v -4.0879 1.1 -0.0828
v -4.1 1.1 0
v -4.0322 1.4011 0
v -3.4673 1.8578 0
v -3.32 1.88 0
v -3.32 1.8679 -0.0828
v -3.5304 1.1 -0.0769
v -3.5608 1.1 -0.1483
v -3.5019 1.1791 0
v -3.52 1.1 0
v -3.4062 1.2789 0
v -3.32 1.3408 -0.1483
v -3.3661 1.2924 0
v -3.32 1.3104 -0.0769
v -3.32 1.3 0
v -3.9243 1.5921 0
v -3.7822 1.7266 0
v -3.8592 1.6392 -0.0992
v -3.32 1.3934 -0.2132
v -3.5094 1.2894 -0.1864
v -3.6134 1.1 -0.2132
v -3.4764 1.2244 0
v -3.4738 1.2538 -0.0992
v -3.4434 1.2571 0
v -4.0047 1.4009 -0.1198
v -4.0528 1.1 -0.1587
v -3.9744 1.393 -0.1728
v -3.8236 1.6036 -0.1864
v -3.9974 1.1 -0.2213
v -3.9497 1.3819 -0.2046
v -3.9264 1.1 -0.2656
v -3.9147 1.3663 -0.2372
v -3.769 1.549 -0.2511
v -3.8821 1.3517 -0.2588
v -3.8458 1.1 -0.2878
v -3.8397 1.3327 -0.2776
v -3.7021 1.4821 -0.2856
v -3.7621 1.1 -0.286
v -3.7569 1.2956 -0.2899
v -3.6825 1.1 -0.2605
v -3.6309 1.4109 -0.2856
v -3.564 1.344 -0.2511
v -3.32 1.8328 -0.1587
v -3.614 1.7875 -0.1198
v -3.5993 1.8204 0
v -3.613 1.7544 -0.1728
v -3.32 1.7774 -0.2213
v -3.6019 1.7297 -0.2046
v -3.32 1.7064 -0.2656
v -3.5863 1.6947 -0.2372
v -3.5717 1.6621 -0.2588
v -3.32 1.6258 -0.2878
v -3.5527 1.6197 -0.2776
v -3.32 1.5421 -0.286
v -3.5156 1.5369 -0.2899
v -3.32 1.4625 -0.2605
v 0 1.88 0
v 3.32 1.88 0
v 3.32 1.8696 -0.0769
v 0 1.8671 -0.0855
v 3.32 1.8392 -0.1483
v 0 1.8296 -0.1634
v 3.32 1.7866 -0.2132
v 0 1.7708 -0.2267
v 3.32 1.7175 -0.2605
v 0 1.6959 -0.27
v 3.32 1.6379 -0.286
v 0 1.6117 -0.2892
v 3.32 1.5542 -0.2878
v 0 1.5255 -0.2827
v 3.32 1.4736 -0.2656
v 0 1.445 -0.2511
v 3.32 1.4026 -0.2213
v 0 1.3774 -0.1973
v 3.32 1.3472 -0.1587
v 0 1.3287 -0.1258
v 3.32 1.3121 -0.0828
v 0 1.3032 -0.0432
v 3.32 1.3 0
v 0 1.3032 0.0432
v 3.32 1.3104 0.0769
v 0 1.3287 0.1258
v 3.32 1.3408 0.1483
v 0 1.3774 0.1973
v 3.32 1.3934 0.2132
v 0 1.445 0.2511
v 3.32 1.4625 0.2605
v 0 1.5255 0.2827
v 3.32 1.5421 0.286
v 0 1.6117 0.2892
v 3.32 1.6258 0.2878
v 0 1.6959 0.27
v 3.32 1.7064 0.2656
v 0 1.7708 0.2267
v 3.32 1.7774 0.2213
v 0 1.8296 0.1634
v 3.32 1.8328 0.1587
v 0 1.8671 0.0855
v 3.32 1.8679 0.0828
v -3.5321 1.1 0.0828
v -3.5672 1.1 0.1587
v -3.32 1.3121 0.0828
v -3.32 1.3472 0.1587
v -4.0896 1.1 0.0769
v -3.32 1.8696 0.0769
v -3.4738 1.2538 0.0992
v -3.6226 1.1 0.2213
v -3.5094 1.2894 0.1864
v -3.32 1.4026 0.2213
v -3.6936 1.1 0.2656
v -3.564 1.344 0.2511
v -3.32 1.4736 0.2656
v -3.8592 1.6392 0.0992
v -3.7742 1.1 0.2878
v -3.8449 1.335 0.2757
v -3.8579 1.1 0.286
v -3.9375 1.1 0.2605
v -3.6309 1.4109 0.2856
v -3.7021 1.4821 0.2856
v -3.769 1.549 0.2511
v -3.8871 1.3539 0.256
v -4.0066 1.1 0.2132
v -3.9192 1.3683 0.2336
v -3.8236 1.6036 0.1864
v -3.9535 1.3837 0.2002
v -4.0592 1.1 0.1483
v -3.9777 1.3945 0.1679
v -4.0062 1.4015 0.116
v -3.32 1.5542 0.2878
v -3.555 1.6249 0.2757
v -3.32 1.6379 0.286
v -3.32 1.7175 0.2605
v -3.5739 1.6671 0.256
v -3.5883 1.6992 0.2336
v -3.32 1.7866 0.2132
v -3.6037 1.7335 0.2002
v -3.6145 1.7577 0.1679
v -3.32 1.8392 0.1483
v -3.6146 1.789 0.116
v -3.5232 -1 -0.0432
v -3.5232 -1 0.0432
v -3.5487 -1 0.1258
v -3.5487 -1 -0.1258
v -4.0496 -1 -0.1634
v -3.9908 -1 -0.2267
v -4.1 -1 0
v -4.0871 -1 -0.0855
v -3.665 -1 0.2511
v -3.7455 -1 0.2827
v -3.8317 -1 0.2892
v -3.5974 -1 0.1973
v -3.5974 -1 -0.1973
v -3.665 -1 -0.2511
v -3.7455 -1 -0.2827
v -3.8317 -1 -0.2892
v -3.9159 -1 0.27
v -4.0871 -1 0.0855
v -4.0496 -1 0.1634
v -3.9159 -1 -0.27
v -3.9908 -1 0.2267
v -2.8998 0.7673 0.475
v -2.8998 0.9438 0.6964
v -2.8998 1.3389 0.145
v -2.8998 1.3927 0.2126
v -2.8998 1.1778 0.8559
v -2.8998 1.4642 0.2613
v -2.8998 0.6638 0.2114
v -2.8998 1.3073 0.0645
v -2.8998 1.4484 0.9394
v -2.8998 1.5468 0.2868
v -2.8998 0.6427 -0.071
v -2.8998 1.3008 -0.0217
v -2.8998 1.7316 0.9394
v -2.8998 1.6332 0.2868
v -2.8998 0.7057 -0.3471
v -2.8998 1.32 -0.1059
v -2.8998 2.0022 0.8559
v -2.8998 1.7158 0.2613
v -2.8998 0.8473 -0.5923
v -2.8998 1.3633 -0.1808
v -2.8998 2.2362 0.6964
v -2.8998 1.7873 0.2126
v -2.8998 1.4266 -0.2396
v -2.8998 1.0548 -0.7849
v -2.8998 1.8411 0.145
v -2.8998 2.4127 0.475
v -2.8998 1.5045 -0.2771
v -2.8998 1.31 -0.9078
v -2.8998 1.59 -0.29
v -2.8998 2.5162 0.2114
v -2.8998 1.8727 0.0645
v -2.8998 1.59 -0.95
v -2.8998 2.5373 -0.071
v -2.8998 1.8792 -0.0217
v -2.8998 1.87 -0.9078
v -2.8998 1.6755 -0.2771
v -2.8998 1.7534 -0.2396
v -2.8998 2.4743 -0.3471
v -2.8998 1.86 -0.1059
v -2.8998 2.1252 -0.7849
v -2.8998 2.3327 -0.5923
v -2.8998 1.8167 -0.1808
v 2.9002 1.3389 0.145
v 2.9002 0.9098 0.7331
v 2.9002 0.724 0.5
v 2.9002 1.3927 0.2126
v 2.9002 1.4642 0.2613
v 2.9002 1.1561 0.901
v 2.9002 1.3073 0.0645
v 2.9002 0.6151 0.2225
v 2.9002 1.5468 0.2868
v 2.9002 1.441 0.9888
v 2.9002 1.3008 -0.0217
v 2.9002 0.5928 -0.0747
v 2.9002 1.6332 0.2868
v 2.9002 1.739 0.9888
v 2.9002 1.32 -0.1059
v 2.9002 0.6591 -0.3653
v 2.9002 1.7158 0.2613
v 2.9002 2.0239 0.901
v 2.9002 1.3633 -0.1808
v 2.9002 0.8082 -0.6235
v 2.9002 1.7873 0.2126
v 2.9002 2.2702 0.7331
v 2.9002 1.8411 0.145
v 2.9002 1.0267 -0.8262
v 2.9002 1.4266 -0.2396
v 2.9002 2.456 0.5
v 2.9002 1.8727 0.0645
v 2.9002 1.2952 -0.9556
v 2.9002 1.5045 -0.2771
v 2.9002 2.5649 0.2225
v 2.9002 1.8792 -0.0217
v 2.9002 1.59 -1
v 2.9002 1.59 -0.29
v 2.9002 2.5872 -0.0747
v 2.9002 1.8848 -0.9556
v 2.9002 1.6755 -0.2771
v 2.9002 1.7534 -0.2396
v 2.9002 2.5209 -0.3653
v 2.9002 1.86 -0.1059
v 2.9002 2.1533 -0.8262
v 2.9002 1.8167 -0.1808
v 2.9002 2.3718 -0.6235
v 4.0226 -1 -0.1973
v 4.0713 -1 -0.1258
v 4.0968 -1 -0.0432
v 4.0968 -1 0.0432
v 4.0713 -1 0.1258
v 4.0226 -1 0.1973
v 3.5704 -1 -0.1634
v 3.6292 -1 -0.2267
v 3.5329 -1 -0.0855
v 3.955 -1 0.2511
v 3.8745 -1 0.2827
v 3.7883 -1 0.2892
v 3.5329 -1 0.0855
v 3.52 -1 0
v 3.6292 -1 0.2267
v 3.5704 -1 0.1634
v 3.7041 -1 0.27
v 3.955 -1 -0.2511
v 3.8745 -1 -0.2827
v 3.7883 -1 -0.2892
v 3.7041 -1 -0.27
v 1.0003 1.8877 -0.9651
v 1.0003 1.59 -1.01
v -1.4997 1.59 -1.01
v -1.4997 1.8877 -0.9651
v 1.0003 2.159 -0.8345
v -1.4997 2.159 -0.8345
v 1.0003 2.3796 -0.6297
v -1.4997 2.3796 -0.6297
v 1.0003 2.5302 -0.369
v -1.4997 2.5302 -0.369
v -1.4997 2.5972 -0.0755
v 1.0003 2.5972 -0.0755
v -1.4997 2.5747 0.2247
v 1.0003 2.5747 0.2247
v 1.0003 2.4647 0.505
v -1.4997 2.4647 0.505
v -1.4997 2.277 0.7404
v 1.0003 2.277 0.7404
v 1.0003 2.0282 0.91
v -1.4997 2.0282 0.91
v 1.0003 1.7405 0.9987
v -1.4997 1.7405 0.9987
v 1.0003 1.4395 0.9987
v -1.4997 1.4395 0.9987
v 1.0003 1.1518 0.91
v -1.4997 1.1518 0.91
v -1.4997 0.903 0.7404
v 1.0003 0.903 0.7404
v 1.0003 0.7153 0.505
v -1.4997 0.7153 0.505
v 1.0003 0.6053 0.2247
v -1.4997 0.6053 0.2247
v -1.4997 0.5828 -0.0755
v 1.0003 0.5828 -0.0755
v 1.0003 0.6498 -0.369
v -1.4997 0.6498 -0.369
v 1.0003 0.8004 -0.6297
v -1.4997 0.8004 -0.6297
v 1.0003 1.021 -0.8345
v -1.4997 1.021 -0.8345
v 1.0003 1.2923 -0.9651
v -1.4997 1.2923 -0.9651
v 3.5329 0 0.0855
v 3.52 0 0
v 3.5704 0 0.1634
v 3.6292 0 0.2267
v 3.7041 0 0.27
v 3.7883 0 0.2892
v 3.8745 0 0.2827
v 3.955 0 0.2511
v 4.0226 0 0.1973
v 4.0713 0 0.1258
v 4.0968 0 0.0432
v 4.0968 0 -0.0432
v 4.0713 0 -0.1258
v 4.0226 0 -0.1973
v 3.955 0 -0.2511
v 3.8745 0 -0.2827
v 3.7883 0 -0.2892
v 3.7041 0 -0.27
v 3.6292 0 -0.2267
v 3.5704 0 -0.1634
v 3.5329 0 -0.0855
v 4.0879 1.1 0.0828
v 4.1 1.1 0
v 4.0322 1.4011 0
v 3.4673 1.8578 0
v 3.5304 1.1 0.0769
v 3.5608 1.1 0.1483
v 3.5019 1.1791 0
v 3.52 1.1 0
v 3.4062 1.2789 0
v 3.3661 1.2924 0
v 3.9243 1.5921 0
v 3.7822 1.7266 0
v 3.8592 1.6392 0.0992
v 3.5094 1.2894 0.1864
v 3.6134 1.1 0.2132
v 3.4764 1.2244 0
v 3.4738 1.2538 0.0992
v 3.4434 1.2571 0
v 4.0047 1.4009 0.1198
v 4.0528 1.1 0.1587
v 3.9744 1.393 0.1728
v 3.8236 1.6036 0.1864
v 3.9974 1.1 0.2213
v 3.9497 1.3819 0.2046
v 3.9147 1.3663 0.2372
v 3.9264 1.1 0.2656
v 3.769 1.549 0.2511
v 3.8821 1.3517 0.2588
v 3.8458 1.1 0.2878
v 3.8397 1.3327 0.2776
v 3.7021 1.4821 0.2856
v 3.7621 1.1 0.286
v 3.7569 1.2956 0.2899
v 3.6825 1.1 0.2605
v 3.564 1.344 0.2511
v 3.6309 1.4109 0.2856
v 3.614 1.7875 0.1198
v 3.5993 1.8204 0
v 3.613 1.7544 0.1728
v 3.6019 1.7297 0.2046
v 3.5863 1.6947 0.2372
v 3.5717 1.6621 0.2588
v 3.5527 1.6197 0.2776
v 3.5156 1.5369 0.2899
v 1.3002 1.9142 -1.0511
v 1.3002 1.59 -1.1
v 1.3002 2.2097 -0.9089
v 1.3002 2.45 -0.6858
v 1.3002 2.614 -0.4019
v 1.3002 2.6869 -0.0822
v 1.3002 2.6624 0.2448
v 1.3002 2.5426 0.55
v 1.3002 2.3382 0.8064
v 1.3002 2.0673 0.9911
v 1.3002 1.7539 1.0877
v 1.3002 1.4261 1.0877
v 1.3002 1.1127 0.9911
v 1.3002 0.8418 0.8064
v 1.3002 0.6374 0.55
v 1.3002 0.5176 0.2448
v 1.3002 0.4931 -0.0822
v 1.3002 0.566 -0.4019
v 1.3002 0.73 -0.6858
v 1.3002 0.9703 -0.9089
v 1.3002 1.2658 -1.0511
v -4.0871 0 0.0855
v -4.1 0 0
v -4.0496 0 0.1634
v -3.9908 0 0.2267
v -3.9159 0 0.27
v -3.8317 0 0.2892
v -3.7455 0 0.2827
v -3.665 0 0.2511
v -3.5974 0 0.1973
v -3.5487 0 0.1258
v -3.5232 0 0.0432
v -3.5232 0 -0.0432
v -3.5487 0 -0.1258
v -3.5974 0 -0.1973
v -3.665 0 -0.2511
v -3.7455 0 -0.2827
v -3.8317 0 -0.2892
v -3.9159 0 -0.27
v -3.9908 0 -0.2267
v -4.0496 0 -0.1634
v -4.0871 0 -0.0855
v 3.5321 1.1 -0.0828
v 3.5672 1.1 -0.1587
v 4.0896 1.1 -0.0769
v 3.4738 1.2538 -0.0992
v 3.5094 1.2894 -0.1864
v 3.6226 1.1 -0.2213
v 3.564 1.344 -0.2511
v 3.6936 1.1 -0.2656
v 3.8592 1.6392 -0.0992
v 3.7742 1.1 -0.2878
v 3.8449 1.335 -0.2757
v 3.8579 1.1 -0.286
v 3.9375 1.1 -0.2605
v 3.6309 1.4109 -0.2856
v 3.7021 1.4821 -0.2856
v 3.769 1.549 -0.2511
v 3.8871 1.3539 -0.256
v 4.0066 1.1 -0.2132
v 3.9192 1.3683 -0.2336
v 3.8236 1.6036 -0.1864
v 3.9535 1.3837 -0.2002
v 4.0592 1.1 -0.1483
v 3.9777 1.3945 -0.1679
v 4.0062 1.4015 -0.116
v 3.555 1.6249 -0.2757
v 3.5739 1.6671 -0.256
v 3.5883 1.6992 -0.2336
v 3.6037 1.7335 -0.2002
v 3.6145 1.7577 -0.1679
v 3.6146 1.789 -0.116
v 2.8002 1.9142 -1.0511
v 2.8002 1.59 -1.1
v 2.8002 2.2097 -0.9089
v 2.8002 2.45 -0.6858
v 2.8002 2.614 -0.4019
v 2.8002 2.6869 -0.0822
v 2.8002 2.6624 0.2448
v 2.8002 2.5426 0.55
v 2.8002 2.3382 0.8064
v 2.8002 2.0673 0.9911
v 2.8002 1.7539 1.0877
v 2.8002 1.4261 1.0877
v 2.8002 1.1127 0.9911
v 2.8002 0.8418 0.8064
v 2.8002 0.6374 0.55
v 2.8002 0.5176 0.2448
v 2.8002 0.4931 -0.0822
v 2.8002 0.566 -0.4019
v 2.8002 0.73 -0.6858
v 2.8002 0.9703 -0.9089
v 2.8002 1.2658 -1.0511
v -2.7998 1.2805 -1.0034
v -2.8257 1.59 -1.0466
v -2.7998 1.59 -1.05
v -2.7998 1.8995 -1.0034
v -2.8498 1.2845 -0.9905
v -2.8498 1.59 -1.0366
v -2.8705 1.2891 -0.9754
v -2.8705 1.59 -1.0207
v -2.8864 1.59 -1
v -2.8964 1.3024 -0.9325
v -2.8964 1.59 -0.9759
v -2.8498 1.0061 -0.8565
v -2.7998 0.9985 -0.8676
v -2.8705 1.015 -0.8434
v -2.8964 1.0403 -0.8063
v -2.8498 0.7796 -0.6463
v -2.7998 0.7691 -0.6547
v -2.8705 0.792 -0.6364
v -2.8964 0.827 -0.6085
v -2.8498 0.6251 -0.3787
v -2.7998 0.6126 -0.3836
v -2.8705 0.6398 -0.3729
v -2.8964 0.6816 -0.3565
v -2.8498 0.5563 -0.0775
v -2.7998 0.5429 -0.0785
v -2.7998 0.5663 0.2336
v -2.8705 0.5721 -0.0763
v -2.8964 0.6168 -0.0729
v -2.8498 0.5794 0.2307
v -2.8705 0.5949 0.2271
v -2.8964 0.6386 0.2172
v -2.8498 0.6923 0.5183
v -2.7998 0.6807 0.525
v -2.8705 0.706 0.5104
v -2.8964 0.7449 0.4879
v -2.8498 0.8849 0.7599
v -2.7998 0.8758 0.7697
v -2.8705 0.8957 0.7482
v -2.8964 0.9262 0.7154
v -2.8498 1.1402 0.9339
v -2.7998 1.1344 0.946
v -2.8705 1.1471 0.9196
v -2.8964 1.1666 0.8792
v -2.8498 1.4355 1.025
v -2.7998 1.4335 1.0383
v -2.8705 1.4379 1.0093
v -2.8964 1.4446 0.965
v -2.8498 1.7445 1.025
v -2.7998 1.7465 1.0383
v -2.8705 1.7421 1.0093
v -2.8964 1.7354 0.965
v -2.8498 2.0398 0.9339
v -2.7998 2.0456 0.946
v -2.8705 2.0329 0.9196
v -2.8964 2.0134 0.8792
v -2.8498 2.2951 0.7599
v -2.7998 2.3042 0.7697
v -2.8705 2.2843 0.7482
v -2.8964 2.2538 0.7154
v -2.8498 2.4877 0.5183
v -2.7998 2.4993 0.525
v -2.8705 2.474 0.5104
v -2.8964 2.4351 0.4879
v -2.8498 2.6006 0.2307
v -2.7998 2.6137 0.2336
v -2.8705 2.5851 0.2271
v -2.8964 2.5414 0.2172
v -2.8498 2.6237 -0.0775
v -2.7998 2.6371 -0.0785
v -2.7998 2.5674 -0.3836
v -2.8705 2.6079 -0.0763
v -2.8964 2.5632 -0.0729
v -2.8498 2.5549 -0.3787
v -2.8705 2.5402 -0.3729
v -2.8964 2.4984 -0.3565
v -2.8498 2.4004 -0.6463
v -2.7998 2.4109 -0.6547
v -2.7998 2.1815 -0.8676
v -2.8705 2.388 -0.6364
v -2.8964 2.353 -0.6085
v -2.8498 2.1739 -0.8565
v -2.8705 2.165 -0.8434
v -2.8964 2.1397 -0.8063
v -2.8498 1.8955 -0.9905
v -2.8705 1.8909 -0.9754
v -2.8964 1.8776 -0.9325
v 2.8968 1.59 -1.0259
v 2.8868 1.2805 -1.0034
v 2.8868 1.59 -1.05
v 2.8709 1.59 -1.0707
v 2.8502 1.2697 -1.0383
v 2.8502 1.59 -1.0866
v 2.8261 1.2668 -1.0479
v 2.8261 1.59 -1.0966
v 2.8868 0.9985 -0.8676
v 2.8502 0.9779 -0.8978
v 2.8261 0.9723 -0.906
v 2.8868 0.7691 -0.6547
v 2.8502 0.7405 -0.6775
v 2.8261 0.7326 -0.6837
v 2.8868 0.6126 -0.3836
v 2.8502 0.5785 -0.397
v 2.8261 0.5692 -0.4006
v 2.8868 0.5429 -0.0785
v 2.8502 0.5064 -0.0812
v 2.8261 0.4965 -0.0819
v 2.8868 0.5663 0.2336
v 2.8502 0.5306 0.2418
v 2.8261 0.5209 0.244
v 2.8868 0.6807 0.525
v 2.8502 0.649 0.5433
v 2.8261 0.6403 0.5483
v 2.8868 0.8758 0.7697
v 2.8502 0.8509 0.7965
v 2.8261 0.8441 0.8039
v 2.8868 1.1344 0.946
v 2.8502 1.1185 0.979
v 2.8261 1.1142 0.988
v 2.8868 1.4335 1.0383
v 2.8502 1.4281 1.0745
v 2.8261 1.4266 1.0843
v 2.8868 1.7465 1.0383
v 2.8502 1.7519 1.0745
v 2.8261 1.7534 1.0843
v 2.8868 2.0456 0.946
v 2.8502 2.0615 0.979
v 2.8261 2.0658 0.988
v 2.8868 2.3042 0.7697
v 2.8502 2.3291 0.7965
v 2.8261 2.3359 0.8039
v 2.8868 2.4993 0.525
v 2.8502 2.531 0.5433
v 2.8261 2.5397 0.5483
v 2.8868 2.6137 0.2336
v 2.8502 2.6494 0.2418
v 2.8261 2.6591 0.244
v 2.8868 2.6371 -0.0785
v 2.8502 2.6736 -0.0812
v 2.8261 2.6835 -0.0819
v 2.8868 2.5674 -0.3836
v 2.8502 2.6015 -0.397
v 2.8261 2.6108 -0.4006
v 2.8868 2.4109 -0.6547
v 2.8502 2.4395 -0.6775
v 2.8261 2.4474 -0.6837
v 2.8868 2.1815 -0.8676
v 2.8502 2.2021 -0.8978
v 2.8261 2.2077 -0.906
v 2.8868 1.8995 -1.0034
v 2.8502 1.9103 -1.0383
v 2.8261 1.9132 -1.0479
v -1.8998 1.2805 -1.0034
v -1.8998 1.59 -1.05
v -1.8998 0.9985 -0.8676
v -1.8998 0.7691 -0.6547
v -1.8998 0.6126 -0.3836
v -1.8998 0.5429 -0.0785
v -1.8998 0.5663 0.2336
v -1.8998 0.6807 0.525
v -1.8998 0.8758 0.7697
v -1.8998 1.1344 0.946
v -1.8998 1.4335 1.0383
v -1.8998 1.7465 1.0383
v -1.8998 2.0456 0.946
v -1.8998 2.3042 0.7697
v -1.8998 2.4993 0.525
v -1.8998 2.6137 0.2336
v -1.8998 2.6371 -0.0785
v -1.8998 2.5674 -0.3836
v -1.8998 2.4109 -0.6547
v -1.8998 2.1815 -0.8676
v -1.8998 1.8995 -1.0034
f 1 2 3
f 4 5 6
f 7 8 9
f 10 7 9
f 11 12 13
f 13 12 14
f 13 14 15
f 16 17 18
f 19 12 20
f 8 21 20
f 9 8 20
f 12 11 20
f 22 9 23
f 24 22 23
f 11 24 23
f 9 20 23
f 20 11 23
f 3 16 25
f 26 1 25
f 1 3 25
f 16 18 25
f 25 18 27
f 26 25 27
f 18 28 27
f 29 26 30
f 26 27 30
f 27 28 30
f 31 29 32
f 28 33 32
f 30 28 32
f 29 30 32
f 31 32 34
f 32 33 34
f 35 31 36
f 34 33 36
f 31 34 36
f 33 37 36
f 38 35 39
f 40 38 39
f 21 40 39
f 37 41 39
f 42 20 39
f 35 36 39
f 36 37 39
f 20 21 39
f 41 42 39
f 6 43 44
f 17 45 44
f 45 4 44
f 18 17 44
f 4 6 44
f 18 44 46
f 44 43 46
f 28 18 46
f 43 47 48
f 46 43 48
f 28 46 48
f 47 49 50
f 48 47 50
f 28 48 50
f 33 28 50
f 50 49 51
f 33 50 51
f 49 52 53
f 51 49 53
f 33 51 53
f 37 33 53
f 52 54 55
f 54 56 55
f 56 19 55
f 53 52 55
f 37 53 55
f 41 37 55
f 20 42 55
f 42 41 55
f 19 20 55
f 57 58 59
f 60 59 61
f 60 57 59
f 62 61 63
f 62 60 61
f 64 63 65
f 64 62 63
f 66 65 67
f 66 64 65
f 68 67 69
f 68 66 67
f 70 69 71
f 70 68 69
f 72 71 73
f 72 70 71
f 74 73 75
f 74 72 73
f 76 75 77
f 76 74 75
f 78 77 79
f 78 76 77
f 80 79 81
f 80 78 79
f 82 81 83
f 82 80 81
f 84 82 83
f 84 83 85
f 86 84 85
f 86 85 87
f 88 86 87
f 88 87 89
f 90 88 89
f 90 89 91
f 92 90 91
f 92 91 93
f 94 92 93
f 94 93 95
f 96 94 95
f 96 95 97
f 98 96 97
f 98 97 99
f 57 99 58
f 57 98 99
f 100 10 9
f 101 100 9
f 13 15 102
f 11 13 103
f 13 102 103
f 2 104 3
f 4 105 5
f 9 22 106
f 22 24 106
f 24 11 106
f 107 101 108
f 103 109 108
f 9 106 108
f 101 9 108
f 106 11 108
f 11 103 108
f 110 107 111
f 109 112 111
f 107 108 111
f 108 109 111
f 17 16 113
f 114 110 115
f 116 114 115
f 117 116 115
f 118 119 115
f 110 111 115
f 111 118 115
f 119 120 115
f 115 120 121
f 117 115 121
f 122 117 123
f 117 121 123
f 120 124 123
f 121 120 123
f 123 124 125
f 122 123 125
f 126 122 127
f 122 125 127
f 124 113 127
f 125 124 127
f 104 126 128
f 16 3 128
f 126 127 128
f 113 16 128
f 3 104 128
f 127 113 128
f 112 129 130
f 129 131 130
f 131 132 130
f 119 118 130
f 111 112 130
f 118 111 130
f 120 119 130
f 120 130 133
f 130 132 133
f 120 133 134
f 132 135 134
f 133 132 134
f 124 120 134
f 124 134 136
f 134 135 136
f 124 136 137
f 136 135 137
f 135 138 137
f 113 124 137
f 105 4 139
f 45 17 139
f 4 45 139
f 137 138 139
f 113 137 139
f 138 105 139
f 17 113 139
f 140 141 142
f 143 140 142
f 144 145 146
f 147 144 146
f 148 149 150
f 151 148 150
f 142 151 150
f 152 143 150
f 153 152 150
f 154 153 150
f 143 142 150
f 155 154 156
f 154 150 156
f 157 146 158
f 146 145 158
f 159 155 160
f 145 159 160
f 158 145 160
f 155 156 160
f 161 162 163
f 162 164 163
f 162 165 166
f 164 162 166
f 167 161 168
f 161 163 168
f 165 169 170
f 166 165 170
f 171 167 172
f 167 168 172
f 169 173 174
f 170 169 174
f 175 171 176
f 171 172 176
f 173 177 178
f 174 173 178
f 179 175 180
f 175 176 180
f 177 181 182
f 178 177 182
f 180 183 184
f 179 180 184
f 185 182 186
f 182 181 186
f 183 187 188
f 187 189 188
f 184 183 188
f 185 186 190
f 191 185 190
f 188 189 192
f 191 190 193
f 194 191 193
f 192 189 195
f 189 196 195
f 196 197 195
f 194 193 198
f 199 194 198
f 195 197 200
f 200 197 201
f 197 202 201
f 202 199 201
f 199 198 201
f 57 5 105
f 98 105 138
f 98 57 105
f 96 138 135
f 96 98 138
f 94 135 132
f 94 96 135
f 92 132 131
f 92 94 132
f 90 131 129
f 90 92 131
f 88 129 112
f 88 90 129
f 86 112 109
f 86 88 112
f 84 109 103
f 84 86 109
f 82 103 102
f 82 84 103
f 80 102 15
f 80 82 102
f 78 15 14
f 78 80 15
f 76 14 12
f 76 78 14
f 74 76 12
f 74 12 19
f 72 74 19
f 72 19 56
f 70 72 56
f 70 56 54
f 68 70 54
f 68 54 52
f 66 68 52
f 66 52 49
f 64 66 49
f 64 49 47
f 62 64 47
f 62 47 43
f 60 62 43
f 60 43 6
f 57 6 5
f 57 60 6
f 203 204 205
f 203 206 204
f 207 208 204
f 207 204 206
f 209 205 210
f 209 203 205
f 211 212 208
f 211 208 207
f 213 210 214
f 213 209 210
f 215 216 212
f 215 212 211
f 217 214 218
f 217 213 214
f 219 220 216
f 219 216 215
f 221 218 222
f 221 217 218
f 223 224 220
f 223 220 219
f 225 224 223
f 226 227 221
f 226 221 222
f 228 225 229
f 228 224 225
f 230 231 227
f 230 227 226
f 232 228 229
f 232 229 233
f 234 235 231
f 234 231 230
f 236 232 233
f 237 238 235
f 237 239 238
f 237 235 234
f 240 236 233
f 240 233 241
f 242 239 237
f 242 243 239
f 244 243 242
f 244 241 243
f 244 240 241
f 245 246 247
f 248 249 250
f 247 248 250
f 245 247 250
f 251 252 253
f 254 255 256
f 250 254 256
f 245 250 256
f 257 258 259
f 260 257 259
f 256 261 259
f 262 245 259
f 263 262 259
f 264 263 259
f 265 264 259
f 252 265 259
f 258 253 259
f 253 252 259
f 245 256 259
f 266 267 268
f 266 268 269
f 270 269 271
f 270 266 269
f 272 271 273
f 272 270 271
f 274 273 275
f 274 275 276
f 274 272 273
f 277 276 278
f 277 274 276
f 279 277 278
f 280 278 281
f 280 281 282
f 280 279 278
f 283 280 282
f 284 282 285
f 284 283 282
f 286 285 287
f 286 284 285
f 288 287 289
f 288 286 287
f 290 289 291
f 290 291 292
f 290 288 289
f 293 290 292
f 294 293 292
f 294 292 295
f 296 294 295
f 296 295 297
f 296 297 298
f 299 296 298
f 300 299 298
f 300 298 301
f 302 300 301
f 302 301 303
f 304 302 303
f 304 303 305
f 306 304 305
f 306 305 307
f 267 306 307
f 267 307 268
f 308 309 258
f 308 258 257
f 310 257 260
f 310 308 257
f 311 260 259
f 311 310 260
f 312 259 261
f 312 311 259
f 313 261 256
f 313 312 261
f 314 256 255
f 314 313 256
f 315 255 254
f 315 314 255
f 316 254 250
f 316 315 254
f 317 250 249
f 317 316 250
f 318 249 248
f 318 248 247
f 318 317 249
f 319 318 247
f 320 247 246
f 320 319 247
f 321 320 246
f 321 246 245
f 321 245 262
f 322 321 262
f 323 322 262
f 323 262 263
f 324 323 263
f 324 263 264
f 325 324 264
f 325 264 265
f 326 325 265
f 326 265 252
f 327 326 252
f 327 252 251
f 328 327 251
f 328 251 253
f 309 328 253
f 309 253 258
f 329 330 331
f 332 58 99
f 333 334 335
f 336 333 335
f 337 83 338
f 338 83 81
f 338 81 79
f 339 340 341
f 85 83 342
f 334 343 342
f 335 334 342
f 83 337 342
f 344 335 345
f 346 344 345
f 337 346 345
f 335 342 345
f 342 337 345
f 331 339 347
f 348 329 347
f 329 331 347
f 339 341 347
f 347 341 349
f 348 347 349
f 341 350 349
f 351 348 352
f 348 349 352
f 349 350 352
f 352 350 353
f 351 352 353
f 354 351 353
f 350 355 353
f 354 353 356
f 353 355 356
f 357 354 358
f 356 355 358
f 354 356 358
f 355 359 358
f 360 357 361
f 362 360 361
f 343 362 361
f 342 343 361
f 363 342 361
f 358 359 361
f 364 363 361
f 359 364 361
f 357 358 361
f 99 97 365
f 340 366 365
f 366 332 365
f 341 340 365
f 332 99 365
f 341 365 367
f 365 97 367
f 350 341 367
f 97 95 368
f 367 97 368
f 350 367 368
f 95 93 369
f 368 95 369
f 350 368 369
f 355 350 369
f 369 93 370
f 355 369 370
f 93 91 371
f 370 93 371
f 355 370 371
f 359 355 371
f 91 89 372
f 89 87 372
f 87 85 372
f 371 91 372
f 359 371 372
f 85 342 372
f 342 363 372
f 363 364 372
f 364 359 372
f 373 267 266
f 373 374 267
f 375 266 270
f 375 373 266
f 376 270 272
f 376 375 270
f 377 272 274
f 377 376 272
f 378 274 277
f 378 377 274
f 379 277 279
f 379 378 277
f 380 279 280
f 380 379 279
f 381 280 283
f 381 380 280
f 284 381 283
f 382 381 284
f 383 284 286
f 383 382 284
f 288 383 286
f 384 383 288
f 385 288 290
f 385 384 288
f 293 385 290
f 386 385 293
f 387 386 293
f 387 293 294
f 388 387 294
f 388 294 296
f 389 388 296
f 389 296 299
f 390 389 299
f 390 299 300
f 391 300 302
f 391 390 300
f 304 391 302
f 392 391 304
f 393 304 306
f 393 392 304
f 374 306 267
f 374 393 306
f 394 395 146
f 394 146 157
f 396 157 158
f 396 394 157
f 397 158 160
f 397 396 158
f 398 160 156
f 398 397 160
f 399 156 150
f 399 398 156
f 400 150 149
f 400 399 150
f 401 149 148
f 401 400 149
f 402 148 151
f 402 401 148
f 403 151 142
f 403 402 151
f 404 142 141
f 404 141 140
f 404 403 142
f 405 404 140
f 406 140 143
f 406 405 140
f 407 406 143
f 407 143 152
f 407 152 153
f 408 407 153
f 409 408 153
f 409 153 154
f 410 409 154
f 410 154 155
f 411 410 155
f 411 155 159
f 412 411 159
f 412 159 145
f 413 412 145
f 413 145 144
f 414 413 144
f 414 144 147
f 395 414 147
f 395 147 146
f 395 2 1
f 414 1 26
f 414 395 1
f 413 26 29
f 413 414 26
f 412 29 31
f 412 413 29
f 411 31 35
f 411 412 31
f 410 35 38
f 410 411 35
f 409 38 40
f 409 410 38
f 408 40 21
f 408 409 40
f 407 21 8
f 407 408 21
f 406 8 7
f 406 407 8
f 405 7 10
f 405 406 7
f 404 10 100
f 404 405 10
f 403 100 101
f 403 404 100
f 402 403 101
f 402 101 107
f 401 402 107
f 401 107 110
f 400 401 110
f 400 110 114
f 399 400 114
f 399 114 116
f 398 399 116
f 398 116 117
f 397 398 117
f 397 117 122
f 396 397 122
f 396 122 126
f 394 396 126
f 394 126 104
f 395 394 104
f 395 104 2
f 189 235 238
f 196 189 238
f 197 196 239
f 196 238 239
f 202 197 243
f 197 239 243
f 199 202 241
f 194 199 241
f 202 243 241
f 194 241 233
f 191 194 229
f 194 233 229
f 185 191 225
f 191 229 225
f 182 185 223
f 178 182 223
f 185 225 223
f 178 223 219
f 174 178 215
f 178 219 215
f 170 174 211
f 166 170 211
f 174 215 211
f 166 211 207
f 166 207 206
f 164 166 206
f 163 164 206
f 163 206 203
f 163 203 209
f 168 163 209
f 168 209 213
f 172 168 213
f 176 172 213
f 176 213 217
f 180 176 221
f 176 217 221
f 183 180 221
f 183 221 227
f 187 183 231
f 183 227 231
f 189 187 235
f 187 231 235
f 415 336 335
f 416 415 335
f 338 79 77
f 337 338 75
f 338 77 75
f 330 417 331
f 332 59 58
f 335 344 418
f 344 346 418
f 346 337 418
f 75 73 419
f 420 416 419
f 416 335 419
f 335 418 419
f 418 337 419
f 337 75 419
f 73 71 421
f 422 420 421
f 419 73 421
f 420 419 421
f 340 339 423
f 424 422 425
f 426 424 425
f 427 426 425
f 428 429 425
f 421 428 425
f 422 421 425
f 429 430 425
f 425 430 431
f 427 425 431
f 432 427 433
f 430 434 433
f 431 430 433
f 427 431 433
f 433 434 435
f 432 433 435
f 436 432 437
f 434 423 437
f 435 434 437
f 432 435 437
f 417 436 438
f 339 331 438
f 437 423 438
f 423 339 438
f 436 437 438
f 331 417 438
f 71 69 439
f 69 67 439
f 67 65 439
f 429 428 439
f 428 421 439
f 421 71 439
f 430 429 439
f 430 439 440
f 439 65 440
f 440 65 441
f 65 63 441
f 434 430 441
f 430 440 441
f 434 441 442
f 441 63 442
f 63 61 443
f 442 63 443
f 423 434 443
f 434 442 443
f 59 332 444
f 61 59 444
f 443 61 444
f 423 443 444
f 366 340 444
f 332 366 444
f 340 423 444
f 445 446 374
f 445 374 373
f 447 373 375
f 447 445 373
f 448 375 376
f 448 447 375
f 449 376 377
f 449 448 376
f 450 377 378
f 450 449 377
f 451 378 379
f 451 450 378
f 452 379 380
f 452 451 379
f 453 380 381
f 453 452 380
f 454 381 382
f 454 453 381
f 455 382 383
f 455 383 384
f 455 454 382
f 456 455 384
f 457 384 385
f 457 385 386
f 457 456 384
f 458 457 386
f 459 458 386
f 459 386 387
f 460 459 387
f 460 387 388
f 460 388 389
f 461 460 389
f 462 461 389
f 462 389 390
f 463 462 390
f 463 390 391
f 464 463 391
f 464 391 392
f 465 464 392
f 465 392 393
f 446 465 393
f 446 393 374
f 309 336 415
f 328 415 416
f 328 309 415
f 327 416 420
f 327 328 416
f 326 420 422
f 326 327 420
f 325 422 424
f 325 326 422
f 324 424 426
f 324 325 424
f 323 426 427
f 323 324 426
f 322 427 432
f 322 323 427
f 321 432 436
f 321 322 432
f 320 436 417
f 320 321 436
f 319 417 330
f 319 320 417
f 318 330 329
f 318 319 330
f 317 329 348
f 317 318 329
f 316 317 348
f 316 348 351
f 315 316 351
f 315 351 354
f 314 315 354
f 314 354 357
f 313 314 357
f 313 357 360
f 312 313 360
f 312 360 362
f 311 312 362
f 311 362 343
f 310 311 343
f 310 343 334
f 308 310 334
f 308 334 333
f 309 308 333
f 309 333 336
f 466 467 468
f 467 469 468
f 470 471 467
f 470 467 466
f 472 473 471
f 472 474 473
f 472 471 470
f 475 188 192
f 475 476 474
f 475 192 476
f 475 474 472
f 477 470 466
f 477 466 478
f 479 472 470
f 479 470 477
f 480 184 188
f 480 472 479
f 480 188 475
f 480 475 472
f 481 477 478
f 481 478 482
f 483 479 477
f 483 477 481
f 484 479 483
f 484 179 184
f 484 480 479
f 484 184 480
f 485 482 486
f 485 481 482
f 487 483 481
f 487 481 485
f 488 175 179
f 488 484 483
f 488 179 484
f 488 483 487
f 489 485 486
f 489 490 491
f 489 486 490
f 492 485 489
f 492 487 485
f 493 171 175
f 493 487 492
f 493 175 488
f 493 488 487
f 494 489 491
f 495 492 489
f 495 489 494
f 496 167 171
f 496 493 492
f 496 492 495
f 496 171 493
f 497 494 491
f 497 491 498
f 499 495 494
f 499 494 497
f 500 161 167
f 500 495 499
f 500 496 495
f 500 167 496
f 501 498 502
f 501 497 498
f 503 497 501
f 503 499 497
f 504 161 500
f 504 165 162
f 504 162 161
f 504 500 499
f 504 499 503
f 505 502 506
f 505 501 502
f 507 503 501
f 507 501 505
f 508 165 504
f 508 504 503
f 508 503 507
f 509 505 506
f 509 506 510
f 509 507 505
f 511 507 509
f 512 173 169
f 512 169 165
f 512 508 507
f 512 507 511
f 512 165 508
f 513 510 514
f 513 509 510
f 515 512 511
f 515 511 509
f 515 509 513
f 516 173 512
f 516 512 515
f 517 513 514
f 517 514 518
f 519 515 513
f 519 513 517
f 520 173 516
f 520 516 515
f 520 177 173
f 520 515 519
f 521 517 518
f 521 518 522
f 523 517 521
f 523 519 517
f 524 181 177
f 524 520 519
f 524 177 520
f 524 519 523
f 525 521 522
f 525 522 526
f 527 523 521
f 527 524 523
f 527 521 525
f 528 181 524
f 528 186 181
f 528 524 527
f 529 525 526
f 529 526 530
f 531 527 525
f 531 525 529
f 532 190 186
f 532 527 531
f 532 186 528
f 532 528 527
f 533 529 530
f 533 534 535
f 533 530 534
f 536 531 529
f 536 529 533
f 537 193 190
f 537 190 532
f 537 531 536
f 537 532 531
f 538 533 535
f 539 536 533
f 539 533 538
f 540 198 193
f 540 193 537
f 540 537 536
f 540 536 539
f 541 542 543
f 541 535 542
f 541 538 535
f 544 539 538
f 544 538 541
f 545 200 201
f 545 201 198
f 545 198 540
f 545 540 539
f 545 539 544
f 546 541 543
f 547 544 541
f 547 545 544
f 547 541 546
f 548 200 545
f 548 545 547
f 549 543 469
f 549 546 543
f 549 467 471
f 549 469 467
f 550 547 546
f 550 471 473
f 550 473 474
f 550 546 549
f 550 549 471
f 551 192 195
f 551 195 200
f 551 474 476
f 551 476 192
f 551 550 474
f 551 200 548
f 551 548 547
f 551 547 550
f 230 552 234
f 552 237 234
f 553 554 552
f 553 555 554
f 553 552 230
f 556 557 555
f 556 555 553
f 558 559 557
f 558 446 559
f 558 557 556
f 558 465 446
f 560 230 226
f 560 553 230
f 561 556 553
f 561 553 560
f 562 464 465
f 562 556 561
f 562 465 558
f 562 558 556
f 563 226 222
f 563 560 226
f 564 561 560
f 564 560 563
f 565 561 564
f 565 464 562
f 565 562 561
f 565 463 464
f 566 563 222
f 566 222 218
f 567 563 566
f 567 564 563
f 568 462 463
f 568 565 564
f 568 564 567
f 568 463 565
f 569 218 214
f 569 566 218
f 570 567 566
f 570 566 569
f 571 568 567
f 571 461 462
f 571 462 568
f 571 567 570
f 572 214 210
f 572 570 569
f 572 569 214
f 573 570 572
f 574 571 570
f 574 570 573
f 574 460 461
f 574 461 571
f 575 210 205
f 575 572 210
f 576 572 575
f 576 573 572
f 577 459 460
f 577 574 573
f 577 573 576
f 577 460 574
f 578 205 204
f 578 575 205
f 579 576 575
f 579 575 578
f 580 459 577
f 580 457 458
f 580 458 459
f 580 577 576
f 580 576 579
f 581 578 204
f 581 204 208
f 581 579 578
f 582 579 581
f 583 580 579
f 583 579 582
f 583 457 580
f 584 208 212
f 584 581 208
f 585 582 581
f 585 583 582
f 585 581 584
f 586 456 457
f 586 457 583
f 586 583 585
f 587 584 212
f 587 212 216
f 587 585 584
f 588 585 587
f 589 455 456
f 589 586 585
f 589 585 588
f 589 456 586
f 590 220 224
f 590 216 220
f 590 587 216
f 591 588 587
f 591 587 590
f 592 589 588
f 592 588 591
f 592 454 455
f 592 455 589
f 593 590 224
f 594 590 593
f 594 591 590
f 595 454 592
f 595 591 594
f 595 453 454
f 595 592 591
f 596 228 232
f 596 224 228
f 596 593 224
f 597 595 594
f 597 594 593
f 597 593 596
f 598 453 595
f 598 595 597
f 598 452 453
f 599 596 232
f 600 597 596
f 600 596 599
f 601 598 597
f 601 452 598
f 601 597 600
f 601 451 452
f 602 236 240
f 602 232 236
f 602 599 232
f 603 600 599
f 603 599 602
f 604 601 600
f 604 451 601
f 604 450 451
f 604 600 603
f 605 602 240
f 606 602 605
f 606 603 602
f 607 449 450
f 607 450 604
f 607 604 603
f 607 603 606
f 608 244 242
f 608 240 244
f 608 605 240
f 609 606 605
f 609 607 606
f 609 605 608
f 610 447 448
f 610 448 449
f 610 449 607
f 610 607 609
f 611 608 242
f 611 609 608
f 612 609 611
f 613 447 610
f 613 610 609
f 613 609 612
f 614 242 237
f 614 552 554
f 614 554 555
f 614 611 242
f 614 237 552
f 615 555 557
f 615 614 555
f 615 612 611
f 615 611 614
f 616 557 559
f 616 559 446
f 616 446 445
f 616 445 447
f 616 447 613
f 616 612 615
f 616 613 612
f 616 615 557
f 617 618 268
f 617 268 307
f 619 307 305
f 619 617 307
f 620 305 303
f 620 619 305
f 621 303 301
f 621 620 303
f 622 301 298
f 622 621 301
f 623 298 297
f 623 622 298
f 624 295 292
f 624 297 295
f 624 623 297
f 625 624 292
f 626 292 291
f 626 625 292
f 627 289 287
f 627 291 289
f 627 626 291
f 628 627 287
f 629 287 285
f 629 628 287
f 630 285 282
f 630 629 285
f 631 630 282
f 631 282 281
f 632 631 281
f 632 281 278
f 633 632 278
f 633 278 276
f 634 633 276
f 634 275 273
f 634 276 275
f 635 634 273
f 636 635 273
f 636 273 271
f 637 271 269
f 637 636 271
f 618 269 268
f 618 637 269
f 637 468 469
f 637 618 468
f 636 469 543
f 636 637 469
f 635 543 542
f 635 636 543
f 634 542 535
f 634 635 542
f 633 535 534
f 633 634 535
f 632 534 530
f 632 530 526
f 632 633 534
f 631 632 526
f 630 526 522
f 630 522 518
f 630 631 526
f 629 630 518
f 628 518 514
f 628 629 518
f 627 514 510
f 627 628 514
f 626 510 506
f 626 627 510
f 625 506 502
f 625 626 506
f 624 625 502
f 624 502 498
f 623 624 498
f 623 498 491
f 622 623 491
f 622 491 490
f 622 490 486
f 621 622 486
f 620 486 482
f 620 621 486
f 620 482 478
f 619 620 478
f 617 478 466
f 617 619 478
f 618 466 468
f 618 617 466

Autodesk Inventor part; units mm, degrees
sketch "Sketch4" plane through (0, 0, 0) normal (0, 1, 0) x (-1, 0, 0)
  circle A0 centre (3.81, 0) radius 0.29
  circle A1 centre (-3.81, 0) radius 0.29
  point P0 (0, 0)
  dimension "d24" = 3.81
  dimension "d25" = 3.81
  dimension "d26" = 0.58
  dimension "d27" = 0.58
extrude "Extrusion2" add sketch "Sketch4" along normal blind 1.1 and the other way blind 1
sketch "Cable-Outline" plane through (0, 0, 0) normal (0, 0, 1) x (1, 0, 0)
  arc A0 (-3.32, 1.88) -> (-4.1, 1.1) centre (-3.32, 1.1) ccw construction
  line L0 (-3.52, 1.1) -> (-4.1, 1.1) construction
  arc A1 (-3.32, 1.3) -> (-3.52, 1.1) centre (-3.32, 1.1) ccw construction
  line L1 (4.1, 1.1) -> (3.52, 1.1) construction
  arc A2 (3.52, 1.1) -> (3.32, 1.3) centre (3.32, 1.1) ccw construction
  arc A3 (4.1, 1.1) -> (3.32, 1.88) centre (3.32, 1.1) ccw construction
  line L2 (3.32, 1.1) -> (3.32, 1.88) construction
  line L3 (3.32, 1.1) -> (4.1, 1.1) construction
  line L4 (-3.32, 1.88) -> (3.32, 1.88) construction
  line L5 (-3.32, 1.3) -> (3.32, 1.3) construction
  line L6 (-3.4614, 1.2414) -> (-3.8715, 1.6515) construction
  line L7 (3.8715, 1.6515) -> (3.4614, 1.2414) construction
  line L8 (-3.6665, 1.4465) -> (-3.8476, 1.2654) construction
  line L9 (3.6665, 1.4465) -> (3.813, 1.3) construction
  point P0 (0, 0)
  point P1 (0, 1.88)
  point P2 (0, 1.3)
  dimension "d33" = 0.2
  dimension "d36" = 90
  dimension "d37" = 90
  dimension "d38" = 0.58
  dimension "d39" = 90
  dimension "d40" = 90
  dimension "d41" = 0.2
  dimension "d42" = 0.58
  dimension "d43" = 3.32
  dimension "d46" = 90
  dimension "d47" = 90
sketch "Cable-Center" plane through (0, 0, 0) normal (1, 0, 0) x (0, 1, 0)
  line L0 (1.3, 0) -> (1.88, 0) construction
  circle A0 centre (1.59, 0) radius 0.29
  point P0 (0, 0)
  dimension "d82" = 0.58
extrude "Extrusion3" add sketch "Cable-Center" along normal mid plane 6.64
ref_plane "Cable-Plane-A" through (-3.6665, 1.4465, 0) normal (-0.7071068, -0.7071068, 0) x (0.7071068, -0.7071068, 0)
sketch "Cable-Sketch-A" plane through (-3.6665, 1.4465, 0) normal (-0.7071068, -0.7071068, 0) x (0.7071068, -0.7071068, 0)
  circle A0 centre (0, 0) radius 0.29
  point P0 (3.6154, 0)
  dimension "d50" = 0.58
ref_plane "Cable-Plane-B" through (3.6665, 1.4465, 0) normal (0.7071068, -0.7071068, 0) x (0.7071068, 0.7071068, 0)
sketch "Cable-Sketch-B" plane through (3.6665, 1.4465, 0) normal (0.7071068, -0.7071068, 0) x (0.7071068, 0.7071068, 0)
  circle A0 centre (0, 0) radius 0.29
  point P0 (-3.6154, 0)
  point P1 (0.29, 0)
  dimension "d81" = 0.58
loft "Loft4" add profiles "Cable-Sketch-B" section 1 edges at (4.1, 1.1, 0) section 3 edges at (3.32, 1.3, 0)
loft "Loft5" add profiles "Cable-Sketch-A" section 1 edges at (-3.52, 1.1, 0) section 3 edges at (-3.32, 1.3, 0)
ref_plane "Coat-Plane" through (0, 1.59, 0) normal (0, 1, 0) x (-1, 0, 0)
sketch "Coat-Cut" plane through (0, 1.59, 0) normal (0, 1, 0) x (-1, 0, 0)
  line L0 (3.32, -0.29) -> (-3.32, -0.29) projected
  line L1 (2.9, 0.29) -> (-2.9, 0.29)
  line L2 (-2.9, 0.29) -> (-2.9, -0.29)
  line L3 (-2.9, -0.29) -> (2.9, -0.29)
  line L4 (2.9, -0.29) -> (2.9, 0.29)
  line L5 (2.9, 0.29) -> (-2.9, -0.29) construction
  line L6 (-2.9, 0.29) -> (2.9, -0.29) construction
  point P0 (0, 0)
  dimension "d63" = 5.8
sketch "Sketch11" plane through (0, 1.59, 0) normal (0, 1, 0) x (-1, 0, 0)
  circle A0 centre (3.81, 0) radius 0.29 projected
  line L0 (4.1, 0) -> (-4.1, 0)
  circle A1 centre (-3.81, 0) radius 0.29 projected
  line L1 (2.8998, -0.29) -> (2.8998, -0.95)
  line L2 (-1.0003, -1.01) -> (-1.3002, -1.1)
  line L3 (-1.3002, -1.1) -> (-2.8002, -1.1)
  line L4 (-2.9002, -1) -> (-2.9002, -0.29)
  arc A2 (-2.9002, -1) -> (-2.8002, -1.1) centre (-2.8002, -1) ccw
  line L5 (2.8998, -0.29) -> (-2.9002, -0.29)
  line L6 (3.32, -0.29) -> (-3.32, -0.29) projected
  line L7 (2.7998, -1.05) -> (1.8998, -1.05)
  line L8 (1.8998, -1.05) -> (1.4997, -1.01)
  line L9 (1.4997, -1.01) -> (-1.0003, -1.01)
  arc A3 (2.7998, -1.05) -> (2.8998, -0.95) centre (2.7998, -0.95) ccw
  point P0 (0, 0)
  point P1 (0, 0)
  point P2 (-2.9002, -1.1)
  point P3 (2.8998, -1.05)
  point P4 (-0.0002, -0.29)
  dimension "d67" = 0.81
  dimension "d68" = 1.6
  dimension "d69" = 0.1
  dimension "d72" = 0.76
  dimension "d73" = 1
  dimension "d74" = 2.5
  dimension "d75" = 0.1
  dimension "d76" = 0.72
  dimension "d83" = 0.29
revolve "Coat-Body" add sketch "Sketch11" angle 360 about axis through (-4.1, 1.59, 0) along (1, 0, 0) separate body contours L1 A3 L7 L8 L9 L2 L3 A2 L4 L5
equation "\"d27\" = d26"
equation "\"d82\" = d26"
equation "\"d44\" = 2 * d43"
equation "\"d50\" = d26"
equation "\"d81\" = d26"
equation "\"d83\" = 0.5 * d26"
properties part number "Res"
